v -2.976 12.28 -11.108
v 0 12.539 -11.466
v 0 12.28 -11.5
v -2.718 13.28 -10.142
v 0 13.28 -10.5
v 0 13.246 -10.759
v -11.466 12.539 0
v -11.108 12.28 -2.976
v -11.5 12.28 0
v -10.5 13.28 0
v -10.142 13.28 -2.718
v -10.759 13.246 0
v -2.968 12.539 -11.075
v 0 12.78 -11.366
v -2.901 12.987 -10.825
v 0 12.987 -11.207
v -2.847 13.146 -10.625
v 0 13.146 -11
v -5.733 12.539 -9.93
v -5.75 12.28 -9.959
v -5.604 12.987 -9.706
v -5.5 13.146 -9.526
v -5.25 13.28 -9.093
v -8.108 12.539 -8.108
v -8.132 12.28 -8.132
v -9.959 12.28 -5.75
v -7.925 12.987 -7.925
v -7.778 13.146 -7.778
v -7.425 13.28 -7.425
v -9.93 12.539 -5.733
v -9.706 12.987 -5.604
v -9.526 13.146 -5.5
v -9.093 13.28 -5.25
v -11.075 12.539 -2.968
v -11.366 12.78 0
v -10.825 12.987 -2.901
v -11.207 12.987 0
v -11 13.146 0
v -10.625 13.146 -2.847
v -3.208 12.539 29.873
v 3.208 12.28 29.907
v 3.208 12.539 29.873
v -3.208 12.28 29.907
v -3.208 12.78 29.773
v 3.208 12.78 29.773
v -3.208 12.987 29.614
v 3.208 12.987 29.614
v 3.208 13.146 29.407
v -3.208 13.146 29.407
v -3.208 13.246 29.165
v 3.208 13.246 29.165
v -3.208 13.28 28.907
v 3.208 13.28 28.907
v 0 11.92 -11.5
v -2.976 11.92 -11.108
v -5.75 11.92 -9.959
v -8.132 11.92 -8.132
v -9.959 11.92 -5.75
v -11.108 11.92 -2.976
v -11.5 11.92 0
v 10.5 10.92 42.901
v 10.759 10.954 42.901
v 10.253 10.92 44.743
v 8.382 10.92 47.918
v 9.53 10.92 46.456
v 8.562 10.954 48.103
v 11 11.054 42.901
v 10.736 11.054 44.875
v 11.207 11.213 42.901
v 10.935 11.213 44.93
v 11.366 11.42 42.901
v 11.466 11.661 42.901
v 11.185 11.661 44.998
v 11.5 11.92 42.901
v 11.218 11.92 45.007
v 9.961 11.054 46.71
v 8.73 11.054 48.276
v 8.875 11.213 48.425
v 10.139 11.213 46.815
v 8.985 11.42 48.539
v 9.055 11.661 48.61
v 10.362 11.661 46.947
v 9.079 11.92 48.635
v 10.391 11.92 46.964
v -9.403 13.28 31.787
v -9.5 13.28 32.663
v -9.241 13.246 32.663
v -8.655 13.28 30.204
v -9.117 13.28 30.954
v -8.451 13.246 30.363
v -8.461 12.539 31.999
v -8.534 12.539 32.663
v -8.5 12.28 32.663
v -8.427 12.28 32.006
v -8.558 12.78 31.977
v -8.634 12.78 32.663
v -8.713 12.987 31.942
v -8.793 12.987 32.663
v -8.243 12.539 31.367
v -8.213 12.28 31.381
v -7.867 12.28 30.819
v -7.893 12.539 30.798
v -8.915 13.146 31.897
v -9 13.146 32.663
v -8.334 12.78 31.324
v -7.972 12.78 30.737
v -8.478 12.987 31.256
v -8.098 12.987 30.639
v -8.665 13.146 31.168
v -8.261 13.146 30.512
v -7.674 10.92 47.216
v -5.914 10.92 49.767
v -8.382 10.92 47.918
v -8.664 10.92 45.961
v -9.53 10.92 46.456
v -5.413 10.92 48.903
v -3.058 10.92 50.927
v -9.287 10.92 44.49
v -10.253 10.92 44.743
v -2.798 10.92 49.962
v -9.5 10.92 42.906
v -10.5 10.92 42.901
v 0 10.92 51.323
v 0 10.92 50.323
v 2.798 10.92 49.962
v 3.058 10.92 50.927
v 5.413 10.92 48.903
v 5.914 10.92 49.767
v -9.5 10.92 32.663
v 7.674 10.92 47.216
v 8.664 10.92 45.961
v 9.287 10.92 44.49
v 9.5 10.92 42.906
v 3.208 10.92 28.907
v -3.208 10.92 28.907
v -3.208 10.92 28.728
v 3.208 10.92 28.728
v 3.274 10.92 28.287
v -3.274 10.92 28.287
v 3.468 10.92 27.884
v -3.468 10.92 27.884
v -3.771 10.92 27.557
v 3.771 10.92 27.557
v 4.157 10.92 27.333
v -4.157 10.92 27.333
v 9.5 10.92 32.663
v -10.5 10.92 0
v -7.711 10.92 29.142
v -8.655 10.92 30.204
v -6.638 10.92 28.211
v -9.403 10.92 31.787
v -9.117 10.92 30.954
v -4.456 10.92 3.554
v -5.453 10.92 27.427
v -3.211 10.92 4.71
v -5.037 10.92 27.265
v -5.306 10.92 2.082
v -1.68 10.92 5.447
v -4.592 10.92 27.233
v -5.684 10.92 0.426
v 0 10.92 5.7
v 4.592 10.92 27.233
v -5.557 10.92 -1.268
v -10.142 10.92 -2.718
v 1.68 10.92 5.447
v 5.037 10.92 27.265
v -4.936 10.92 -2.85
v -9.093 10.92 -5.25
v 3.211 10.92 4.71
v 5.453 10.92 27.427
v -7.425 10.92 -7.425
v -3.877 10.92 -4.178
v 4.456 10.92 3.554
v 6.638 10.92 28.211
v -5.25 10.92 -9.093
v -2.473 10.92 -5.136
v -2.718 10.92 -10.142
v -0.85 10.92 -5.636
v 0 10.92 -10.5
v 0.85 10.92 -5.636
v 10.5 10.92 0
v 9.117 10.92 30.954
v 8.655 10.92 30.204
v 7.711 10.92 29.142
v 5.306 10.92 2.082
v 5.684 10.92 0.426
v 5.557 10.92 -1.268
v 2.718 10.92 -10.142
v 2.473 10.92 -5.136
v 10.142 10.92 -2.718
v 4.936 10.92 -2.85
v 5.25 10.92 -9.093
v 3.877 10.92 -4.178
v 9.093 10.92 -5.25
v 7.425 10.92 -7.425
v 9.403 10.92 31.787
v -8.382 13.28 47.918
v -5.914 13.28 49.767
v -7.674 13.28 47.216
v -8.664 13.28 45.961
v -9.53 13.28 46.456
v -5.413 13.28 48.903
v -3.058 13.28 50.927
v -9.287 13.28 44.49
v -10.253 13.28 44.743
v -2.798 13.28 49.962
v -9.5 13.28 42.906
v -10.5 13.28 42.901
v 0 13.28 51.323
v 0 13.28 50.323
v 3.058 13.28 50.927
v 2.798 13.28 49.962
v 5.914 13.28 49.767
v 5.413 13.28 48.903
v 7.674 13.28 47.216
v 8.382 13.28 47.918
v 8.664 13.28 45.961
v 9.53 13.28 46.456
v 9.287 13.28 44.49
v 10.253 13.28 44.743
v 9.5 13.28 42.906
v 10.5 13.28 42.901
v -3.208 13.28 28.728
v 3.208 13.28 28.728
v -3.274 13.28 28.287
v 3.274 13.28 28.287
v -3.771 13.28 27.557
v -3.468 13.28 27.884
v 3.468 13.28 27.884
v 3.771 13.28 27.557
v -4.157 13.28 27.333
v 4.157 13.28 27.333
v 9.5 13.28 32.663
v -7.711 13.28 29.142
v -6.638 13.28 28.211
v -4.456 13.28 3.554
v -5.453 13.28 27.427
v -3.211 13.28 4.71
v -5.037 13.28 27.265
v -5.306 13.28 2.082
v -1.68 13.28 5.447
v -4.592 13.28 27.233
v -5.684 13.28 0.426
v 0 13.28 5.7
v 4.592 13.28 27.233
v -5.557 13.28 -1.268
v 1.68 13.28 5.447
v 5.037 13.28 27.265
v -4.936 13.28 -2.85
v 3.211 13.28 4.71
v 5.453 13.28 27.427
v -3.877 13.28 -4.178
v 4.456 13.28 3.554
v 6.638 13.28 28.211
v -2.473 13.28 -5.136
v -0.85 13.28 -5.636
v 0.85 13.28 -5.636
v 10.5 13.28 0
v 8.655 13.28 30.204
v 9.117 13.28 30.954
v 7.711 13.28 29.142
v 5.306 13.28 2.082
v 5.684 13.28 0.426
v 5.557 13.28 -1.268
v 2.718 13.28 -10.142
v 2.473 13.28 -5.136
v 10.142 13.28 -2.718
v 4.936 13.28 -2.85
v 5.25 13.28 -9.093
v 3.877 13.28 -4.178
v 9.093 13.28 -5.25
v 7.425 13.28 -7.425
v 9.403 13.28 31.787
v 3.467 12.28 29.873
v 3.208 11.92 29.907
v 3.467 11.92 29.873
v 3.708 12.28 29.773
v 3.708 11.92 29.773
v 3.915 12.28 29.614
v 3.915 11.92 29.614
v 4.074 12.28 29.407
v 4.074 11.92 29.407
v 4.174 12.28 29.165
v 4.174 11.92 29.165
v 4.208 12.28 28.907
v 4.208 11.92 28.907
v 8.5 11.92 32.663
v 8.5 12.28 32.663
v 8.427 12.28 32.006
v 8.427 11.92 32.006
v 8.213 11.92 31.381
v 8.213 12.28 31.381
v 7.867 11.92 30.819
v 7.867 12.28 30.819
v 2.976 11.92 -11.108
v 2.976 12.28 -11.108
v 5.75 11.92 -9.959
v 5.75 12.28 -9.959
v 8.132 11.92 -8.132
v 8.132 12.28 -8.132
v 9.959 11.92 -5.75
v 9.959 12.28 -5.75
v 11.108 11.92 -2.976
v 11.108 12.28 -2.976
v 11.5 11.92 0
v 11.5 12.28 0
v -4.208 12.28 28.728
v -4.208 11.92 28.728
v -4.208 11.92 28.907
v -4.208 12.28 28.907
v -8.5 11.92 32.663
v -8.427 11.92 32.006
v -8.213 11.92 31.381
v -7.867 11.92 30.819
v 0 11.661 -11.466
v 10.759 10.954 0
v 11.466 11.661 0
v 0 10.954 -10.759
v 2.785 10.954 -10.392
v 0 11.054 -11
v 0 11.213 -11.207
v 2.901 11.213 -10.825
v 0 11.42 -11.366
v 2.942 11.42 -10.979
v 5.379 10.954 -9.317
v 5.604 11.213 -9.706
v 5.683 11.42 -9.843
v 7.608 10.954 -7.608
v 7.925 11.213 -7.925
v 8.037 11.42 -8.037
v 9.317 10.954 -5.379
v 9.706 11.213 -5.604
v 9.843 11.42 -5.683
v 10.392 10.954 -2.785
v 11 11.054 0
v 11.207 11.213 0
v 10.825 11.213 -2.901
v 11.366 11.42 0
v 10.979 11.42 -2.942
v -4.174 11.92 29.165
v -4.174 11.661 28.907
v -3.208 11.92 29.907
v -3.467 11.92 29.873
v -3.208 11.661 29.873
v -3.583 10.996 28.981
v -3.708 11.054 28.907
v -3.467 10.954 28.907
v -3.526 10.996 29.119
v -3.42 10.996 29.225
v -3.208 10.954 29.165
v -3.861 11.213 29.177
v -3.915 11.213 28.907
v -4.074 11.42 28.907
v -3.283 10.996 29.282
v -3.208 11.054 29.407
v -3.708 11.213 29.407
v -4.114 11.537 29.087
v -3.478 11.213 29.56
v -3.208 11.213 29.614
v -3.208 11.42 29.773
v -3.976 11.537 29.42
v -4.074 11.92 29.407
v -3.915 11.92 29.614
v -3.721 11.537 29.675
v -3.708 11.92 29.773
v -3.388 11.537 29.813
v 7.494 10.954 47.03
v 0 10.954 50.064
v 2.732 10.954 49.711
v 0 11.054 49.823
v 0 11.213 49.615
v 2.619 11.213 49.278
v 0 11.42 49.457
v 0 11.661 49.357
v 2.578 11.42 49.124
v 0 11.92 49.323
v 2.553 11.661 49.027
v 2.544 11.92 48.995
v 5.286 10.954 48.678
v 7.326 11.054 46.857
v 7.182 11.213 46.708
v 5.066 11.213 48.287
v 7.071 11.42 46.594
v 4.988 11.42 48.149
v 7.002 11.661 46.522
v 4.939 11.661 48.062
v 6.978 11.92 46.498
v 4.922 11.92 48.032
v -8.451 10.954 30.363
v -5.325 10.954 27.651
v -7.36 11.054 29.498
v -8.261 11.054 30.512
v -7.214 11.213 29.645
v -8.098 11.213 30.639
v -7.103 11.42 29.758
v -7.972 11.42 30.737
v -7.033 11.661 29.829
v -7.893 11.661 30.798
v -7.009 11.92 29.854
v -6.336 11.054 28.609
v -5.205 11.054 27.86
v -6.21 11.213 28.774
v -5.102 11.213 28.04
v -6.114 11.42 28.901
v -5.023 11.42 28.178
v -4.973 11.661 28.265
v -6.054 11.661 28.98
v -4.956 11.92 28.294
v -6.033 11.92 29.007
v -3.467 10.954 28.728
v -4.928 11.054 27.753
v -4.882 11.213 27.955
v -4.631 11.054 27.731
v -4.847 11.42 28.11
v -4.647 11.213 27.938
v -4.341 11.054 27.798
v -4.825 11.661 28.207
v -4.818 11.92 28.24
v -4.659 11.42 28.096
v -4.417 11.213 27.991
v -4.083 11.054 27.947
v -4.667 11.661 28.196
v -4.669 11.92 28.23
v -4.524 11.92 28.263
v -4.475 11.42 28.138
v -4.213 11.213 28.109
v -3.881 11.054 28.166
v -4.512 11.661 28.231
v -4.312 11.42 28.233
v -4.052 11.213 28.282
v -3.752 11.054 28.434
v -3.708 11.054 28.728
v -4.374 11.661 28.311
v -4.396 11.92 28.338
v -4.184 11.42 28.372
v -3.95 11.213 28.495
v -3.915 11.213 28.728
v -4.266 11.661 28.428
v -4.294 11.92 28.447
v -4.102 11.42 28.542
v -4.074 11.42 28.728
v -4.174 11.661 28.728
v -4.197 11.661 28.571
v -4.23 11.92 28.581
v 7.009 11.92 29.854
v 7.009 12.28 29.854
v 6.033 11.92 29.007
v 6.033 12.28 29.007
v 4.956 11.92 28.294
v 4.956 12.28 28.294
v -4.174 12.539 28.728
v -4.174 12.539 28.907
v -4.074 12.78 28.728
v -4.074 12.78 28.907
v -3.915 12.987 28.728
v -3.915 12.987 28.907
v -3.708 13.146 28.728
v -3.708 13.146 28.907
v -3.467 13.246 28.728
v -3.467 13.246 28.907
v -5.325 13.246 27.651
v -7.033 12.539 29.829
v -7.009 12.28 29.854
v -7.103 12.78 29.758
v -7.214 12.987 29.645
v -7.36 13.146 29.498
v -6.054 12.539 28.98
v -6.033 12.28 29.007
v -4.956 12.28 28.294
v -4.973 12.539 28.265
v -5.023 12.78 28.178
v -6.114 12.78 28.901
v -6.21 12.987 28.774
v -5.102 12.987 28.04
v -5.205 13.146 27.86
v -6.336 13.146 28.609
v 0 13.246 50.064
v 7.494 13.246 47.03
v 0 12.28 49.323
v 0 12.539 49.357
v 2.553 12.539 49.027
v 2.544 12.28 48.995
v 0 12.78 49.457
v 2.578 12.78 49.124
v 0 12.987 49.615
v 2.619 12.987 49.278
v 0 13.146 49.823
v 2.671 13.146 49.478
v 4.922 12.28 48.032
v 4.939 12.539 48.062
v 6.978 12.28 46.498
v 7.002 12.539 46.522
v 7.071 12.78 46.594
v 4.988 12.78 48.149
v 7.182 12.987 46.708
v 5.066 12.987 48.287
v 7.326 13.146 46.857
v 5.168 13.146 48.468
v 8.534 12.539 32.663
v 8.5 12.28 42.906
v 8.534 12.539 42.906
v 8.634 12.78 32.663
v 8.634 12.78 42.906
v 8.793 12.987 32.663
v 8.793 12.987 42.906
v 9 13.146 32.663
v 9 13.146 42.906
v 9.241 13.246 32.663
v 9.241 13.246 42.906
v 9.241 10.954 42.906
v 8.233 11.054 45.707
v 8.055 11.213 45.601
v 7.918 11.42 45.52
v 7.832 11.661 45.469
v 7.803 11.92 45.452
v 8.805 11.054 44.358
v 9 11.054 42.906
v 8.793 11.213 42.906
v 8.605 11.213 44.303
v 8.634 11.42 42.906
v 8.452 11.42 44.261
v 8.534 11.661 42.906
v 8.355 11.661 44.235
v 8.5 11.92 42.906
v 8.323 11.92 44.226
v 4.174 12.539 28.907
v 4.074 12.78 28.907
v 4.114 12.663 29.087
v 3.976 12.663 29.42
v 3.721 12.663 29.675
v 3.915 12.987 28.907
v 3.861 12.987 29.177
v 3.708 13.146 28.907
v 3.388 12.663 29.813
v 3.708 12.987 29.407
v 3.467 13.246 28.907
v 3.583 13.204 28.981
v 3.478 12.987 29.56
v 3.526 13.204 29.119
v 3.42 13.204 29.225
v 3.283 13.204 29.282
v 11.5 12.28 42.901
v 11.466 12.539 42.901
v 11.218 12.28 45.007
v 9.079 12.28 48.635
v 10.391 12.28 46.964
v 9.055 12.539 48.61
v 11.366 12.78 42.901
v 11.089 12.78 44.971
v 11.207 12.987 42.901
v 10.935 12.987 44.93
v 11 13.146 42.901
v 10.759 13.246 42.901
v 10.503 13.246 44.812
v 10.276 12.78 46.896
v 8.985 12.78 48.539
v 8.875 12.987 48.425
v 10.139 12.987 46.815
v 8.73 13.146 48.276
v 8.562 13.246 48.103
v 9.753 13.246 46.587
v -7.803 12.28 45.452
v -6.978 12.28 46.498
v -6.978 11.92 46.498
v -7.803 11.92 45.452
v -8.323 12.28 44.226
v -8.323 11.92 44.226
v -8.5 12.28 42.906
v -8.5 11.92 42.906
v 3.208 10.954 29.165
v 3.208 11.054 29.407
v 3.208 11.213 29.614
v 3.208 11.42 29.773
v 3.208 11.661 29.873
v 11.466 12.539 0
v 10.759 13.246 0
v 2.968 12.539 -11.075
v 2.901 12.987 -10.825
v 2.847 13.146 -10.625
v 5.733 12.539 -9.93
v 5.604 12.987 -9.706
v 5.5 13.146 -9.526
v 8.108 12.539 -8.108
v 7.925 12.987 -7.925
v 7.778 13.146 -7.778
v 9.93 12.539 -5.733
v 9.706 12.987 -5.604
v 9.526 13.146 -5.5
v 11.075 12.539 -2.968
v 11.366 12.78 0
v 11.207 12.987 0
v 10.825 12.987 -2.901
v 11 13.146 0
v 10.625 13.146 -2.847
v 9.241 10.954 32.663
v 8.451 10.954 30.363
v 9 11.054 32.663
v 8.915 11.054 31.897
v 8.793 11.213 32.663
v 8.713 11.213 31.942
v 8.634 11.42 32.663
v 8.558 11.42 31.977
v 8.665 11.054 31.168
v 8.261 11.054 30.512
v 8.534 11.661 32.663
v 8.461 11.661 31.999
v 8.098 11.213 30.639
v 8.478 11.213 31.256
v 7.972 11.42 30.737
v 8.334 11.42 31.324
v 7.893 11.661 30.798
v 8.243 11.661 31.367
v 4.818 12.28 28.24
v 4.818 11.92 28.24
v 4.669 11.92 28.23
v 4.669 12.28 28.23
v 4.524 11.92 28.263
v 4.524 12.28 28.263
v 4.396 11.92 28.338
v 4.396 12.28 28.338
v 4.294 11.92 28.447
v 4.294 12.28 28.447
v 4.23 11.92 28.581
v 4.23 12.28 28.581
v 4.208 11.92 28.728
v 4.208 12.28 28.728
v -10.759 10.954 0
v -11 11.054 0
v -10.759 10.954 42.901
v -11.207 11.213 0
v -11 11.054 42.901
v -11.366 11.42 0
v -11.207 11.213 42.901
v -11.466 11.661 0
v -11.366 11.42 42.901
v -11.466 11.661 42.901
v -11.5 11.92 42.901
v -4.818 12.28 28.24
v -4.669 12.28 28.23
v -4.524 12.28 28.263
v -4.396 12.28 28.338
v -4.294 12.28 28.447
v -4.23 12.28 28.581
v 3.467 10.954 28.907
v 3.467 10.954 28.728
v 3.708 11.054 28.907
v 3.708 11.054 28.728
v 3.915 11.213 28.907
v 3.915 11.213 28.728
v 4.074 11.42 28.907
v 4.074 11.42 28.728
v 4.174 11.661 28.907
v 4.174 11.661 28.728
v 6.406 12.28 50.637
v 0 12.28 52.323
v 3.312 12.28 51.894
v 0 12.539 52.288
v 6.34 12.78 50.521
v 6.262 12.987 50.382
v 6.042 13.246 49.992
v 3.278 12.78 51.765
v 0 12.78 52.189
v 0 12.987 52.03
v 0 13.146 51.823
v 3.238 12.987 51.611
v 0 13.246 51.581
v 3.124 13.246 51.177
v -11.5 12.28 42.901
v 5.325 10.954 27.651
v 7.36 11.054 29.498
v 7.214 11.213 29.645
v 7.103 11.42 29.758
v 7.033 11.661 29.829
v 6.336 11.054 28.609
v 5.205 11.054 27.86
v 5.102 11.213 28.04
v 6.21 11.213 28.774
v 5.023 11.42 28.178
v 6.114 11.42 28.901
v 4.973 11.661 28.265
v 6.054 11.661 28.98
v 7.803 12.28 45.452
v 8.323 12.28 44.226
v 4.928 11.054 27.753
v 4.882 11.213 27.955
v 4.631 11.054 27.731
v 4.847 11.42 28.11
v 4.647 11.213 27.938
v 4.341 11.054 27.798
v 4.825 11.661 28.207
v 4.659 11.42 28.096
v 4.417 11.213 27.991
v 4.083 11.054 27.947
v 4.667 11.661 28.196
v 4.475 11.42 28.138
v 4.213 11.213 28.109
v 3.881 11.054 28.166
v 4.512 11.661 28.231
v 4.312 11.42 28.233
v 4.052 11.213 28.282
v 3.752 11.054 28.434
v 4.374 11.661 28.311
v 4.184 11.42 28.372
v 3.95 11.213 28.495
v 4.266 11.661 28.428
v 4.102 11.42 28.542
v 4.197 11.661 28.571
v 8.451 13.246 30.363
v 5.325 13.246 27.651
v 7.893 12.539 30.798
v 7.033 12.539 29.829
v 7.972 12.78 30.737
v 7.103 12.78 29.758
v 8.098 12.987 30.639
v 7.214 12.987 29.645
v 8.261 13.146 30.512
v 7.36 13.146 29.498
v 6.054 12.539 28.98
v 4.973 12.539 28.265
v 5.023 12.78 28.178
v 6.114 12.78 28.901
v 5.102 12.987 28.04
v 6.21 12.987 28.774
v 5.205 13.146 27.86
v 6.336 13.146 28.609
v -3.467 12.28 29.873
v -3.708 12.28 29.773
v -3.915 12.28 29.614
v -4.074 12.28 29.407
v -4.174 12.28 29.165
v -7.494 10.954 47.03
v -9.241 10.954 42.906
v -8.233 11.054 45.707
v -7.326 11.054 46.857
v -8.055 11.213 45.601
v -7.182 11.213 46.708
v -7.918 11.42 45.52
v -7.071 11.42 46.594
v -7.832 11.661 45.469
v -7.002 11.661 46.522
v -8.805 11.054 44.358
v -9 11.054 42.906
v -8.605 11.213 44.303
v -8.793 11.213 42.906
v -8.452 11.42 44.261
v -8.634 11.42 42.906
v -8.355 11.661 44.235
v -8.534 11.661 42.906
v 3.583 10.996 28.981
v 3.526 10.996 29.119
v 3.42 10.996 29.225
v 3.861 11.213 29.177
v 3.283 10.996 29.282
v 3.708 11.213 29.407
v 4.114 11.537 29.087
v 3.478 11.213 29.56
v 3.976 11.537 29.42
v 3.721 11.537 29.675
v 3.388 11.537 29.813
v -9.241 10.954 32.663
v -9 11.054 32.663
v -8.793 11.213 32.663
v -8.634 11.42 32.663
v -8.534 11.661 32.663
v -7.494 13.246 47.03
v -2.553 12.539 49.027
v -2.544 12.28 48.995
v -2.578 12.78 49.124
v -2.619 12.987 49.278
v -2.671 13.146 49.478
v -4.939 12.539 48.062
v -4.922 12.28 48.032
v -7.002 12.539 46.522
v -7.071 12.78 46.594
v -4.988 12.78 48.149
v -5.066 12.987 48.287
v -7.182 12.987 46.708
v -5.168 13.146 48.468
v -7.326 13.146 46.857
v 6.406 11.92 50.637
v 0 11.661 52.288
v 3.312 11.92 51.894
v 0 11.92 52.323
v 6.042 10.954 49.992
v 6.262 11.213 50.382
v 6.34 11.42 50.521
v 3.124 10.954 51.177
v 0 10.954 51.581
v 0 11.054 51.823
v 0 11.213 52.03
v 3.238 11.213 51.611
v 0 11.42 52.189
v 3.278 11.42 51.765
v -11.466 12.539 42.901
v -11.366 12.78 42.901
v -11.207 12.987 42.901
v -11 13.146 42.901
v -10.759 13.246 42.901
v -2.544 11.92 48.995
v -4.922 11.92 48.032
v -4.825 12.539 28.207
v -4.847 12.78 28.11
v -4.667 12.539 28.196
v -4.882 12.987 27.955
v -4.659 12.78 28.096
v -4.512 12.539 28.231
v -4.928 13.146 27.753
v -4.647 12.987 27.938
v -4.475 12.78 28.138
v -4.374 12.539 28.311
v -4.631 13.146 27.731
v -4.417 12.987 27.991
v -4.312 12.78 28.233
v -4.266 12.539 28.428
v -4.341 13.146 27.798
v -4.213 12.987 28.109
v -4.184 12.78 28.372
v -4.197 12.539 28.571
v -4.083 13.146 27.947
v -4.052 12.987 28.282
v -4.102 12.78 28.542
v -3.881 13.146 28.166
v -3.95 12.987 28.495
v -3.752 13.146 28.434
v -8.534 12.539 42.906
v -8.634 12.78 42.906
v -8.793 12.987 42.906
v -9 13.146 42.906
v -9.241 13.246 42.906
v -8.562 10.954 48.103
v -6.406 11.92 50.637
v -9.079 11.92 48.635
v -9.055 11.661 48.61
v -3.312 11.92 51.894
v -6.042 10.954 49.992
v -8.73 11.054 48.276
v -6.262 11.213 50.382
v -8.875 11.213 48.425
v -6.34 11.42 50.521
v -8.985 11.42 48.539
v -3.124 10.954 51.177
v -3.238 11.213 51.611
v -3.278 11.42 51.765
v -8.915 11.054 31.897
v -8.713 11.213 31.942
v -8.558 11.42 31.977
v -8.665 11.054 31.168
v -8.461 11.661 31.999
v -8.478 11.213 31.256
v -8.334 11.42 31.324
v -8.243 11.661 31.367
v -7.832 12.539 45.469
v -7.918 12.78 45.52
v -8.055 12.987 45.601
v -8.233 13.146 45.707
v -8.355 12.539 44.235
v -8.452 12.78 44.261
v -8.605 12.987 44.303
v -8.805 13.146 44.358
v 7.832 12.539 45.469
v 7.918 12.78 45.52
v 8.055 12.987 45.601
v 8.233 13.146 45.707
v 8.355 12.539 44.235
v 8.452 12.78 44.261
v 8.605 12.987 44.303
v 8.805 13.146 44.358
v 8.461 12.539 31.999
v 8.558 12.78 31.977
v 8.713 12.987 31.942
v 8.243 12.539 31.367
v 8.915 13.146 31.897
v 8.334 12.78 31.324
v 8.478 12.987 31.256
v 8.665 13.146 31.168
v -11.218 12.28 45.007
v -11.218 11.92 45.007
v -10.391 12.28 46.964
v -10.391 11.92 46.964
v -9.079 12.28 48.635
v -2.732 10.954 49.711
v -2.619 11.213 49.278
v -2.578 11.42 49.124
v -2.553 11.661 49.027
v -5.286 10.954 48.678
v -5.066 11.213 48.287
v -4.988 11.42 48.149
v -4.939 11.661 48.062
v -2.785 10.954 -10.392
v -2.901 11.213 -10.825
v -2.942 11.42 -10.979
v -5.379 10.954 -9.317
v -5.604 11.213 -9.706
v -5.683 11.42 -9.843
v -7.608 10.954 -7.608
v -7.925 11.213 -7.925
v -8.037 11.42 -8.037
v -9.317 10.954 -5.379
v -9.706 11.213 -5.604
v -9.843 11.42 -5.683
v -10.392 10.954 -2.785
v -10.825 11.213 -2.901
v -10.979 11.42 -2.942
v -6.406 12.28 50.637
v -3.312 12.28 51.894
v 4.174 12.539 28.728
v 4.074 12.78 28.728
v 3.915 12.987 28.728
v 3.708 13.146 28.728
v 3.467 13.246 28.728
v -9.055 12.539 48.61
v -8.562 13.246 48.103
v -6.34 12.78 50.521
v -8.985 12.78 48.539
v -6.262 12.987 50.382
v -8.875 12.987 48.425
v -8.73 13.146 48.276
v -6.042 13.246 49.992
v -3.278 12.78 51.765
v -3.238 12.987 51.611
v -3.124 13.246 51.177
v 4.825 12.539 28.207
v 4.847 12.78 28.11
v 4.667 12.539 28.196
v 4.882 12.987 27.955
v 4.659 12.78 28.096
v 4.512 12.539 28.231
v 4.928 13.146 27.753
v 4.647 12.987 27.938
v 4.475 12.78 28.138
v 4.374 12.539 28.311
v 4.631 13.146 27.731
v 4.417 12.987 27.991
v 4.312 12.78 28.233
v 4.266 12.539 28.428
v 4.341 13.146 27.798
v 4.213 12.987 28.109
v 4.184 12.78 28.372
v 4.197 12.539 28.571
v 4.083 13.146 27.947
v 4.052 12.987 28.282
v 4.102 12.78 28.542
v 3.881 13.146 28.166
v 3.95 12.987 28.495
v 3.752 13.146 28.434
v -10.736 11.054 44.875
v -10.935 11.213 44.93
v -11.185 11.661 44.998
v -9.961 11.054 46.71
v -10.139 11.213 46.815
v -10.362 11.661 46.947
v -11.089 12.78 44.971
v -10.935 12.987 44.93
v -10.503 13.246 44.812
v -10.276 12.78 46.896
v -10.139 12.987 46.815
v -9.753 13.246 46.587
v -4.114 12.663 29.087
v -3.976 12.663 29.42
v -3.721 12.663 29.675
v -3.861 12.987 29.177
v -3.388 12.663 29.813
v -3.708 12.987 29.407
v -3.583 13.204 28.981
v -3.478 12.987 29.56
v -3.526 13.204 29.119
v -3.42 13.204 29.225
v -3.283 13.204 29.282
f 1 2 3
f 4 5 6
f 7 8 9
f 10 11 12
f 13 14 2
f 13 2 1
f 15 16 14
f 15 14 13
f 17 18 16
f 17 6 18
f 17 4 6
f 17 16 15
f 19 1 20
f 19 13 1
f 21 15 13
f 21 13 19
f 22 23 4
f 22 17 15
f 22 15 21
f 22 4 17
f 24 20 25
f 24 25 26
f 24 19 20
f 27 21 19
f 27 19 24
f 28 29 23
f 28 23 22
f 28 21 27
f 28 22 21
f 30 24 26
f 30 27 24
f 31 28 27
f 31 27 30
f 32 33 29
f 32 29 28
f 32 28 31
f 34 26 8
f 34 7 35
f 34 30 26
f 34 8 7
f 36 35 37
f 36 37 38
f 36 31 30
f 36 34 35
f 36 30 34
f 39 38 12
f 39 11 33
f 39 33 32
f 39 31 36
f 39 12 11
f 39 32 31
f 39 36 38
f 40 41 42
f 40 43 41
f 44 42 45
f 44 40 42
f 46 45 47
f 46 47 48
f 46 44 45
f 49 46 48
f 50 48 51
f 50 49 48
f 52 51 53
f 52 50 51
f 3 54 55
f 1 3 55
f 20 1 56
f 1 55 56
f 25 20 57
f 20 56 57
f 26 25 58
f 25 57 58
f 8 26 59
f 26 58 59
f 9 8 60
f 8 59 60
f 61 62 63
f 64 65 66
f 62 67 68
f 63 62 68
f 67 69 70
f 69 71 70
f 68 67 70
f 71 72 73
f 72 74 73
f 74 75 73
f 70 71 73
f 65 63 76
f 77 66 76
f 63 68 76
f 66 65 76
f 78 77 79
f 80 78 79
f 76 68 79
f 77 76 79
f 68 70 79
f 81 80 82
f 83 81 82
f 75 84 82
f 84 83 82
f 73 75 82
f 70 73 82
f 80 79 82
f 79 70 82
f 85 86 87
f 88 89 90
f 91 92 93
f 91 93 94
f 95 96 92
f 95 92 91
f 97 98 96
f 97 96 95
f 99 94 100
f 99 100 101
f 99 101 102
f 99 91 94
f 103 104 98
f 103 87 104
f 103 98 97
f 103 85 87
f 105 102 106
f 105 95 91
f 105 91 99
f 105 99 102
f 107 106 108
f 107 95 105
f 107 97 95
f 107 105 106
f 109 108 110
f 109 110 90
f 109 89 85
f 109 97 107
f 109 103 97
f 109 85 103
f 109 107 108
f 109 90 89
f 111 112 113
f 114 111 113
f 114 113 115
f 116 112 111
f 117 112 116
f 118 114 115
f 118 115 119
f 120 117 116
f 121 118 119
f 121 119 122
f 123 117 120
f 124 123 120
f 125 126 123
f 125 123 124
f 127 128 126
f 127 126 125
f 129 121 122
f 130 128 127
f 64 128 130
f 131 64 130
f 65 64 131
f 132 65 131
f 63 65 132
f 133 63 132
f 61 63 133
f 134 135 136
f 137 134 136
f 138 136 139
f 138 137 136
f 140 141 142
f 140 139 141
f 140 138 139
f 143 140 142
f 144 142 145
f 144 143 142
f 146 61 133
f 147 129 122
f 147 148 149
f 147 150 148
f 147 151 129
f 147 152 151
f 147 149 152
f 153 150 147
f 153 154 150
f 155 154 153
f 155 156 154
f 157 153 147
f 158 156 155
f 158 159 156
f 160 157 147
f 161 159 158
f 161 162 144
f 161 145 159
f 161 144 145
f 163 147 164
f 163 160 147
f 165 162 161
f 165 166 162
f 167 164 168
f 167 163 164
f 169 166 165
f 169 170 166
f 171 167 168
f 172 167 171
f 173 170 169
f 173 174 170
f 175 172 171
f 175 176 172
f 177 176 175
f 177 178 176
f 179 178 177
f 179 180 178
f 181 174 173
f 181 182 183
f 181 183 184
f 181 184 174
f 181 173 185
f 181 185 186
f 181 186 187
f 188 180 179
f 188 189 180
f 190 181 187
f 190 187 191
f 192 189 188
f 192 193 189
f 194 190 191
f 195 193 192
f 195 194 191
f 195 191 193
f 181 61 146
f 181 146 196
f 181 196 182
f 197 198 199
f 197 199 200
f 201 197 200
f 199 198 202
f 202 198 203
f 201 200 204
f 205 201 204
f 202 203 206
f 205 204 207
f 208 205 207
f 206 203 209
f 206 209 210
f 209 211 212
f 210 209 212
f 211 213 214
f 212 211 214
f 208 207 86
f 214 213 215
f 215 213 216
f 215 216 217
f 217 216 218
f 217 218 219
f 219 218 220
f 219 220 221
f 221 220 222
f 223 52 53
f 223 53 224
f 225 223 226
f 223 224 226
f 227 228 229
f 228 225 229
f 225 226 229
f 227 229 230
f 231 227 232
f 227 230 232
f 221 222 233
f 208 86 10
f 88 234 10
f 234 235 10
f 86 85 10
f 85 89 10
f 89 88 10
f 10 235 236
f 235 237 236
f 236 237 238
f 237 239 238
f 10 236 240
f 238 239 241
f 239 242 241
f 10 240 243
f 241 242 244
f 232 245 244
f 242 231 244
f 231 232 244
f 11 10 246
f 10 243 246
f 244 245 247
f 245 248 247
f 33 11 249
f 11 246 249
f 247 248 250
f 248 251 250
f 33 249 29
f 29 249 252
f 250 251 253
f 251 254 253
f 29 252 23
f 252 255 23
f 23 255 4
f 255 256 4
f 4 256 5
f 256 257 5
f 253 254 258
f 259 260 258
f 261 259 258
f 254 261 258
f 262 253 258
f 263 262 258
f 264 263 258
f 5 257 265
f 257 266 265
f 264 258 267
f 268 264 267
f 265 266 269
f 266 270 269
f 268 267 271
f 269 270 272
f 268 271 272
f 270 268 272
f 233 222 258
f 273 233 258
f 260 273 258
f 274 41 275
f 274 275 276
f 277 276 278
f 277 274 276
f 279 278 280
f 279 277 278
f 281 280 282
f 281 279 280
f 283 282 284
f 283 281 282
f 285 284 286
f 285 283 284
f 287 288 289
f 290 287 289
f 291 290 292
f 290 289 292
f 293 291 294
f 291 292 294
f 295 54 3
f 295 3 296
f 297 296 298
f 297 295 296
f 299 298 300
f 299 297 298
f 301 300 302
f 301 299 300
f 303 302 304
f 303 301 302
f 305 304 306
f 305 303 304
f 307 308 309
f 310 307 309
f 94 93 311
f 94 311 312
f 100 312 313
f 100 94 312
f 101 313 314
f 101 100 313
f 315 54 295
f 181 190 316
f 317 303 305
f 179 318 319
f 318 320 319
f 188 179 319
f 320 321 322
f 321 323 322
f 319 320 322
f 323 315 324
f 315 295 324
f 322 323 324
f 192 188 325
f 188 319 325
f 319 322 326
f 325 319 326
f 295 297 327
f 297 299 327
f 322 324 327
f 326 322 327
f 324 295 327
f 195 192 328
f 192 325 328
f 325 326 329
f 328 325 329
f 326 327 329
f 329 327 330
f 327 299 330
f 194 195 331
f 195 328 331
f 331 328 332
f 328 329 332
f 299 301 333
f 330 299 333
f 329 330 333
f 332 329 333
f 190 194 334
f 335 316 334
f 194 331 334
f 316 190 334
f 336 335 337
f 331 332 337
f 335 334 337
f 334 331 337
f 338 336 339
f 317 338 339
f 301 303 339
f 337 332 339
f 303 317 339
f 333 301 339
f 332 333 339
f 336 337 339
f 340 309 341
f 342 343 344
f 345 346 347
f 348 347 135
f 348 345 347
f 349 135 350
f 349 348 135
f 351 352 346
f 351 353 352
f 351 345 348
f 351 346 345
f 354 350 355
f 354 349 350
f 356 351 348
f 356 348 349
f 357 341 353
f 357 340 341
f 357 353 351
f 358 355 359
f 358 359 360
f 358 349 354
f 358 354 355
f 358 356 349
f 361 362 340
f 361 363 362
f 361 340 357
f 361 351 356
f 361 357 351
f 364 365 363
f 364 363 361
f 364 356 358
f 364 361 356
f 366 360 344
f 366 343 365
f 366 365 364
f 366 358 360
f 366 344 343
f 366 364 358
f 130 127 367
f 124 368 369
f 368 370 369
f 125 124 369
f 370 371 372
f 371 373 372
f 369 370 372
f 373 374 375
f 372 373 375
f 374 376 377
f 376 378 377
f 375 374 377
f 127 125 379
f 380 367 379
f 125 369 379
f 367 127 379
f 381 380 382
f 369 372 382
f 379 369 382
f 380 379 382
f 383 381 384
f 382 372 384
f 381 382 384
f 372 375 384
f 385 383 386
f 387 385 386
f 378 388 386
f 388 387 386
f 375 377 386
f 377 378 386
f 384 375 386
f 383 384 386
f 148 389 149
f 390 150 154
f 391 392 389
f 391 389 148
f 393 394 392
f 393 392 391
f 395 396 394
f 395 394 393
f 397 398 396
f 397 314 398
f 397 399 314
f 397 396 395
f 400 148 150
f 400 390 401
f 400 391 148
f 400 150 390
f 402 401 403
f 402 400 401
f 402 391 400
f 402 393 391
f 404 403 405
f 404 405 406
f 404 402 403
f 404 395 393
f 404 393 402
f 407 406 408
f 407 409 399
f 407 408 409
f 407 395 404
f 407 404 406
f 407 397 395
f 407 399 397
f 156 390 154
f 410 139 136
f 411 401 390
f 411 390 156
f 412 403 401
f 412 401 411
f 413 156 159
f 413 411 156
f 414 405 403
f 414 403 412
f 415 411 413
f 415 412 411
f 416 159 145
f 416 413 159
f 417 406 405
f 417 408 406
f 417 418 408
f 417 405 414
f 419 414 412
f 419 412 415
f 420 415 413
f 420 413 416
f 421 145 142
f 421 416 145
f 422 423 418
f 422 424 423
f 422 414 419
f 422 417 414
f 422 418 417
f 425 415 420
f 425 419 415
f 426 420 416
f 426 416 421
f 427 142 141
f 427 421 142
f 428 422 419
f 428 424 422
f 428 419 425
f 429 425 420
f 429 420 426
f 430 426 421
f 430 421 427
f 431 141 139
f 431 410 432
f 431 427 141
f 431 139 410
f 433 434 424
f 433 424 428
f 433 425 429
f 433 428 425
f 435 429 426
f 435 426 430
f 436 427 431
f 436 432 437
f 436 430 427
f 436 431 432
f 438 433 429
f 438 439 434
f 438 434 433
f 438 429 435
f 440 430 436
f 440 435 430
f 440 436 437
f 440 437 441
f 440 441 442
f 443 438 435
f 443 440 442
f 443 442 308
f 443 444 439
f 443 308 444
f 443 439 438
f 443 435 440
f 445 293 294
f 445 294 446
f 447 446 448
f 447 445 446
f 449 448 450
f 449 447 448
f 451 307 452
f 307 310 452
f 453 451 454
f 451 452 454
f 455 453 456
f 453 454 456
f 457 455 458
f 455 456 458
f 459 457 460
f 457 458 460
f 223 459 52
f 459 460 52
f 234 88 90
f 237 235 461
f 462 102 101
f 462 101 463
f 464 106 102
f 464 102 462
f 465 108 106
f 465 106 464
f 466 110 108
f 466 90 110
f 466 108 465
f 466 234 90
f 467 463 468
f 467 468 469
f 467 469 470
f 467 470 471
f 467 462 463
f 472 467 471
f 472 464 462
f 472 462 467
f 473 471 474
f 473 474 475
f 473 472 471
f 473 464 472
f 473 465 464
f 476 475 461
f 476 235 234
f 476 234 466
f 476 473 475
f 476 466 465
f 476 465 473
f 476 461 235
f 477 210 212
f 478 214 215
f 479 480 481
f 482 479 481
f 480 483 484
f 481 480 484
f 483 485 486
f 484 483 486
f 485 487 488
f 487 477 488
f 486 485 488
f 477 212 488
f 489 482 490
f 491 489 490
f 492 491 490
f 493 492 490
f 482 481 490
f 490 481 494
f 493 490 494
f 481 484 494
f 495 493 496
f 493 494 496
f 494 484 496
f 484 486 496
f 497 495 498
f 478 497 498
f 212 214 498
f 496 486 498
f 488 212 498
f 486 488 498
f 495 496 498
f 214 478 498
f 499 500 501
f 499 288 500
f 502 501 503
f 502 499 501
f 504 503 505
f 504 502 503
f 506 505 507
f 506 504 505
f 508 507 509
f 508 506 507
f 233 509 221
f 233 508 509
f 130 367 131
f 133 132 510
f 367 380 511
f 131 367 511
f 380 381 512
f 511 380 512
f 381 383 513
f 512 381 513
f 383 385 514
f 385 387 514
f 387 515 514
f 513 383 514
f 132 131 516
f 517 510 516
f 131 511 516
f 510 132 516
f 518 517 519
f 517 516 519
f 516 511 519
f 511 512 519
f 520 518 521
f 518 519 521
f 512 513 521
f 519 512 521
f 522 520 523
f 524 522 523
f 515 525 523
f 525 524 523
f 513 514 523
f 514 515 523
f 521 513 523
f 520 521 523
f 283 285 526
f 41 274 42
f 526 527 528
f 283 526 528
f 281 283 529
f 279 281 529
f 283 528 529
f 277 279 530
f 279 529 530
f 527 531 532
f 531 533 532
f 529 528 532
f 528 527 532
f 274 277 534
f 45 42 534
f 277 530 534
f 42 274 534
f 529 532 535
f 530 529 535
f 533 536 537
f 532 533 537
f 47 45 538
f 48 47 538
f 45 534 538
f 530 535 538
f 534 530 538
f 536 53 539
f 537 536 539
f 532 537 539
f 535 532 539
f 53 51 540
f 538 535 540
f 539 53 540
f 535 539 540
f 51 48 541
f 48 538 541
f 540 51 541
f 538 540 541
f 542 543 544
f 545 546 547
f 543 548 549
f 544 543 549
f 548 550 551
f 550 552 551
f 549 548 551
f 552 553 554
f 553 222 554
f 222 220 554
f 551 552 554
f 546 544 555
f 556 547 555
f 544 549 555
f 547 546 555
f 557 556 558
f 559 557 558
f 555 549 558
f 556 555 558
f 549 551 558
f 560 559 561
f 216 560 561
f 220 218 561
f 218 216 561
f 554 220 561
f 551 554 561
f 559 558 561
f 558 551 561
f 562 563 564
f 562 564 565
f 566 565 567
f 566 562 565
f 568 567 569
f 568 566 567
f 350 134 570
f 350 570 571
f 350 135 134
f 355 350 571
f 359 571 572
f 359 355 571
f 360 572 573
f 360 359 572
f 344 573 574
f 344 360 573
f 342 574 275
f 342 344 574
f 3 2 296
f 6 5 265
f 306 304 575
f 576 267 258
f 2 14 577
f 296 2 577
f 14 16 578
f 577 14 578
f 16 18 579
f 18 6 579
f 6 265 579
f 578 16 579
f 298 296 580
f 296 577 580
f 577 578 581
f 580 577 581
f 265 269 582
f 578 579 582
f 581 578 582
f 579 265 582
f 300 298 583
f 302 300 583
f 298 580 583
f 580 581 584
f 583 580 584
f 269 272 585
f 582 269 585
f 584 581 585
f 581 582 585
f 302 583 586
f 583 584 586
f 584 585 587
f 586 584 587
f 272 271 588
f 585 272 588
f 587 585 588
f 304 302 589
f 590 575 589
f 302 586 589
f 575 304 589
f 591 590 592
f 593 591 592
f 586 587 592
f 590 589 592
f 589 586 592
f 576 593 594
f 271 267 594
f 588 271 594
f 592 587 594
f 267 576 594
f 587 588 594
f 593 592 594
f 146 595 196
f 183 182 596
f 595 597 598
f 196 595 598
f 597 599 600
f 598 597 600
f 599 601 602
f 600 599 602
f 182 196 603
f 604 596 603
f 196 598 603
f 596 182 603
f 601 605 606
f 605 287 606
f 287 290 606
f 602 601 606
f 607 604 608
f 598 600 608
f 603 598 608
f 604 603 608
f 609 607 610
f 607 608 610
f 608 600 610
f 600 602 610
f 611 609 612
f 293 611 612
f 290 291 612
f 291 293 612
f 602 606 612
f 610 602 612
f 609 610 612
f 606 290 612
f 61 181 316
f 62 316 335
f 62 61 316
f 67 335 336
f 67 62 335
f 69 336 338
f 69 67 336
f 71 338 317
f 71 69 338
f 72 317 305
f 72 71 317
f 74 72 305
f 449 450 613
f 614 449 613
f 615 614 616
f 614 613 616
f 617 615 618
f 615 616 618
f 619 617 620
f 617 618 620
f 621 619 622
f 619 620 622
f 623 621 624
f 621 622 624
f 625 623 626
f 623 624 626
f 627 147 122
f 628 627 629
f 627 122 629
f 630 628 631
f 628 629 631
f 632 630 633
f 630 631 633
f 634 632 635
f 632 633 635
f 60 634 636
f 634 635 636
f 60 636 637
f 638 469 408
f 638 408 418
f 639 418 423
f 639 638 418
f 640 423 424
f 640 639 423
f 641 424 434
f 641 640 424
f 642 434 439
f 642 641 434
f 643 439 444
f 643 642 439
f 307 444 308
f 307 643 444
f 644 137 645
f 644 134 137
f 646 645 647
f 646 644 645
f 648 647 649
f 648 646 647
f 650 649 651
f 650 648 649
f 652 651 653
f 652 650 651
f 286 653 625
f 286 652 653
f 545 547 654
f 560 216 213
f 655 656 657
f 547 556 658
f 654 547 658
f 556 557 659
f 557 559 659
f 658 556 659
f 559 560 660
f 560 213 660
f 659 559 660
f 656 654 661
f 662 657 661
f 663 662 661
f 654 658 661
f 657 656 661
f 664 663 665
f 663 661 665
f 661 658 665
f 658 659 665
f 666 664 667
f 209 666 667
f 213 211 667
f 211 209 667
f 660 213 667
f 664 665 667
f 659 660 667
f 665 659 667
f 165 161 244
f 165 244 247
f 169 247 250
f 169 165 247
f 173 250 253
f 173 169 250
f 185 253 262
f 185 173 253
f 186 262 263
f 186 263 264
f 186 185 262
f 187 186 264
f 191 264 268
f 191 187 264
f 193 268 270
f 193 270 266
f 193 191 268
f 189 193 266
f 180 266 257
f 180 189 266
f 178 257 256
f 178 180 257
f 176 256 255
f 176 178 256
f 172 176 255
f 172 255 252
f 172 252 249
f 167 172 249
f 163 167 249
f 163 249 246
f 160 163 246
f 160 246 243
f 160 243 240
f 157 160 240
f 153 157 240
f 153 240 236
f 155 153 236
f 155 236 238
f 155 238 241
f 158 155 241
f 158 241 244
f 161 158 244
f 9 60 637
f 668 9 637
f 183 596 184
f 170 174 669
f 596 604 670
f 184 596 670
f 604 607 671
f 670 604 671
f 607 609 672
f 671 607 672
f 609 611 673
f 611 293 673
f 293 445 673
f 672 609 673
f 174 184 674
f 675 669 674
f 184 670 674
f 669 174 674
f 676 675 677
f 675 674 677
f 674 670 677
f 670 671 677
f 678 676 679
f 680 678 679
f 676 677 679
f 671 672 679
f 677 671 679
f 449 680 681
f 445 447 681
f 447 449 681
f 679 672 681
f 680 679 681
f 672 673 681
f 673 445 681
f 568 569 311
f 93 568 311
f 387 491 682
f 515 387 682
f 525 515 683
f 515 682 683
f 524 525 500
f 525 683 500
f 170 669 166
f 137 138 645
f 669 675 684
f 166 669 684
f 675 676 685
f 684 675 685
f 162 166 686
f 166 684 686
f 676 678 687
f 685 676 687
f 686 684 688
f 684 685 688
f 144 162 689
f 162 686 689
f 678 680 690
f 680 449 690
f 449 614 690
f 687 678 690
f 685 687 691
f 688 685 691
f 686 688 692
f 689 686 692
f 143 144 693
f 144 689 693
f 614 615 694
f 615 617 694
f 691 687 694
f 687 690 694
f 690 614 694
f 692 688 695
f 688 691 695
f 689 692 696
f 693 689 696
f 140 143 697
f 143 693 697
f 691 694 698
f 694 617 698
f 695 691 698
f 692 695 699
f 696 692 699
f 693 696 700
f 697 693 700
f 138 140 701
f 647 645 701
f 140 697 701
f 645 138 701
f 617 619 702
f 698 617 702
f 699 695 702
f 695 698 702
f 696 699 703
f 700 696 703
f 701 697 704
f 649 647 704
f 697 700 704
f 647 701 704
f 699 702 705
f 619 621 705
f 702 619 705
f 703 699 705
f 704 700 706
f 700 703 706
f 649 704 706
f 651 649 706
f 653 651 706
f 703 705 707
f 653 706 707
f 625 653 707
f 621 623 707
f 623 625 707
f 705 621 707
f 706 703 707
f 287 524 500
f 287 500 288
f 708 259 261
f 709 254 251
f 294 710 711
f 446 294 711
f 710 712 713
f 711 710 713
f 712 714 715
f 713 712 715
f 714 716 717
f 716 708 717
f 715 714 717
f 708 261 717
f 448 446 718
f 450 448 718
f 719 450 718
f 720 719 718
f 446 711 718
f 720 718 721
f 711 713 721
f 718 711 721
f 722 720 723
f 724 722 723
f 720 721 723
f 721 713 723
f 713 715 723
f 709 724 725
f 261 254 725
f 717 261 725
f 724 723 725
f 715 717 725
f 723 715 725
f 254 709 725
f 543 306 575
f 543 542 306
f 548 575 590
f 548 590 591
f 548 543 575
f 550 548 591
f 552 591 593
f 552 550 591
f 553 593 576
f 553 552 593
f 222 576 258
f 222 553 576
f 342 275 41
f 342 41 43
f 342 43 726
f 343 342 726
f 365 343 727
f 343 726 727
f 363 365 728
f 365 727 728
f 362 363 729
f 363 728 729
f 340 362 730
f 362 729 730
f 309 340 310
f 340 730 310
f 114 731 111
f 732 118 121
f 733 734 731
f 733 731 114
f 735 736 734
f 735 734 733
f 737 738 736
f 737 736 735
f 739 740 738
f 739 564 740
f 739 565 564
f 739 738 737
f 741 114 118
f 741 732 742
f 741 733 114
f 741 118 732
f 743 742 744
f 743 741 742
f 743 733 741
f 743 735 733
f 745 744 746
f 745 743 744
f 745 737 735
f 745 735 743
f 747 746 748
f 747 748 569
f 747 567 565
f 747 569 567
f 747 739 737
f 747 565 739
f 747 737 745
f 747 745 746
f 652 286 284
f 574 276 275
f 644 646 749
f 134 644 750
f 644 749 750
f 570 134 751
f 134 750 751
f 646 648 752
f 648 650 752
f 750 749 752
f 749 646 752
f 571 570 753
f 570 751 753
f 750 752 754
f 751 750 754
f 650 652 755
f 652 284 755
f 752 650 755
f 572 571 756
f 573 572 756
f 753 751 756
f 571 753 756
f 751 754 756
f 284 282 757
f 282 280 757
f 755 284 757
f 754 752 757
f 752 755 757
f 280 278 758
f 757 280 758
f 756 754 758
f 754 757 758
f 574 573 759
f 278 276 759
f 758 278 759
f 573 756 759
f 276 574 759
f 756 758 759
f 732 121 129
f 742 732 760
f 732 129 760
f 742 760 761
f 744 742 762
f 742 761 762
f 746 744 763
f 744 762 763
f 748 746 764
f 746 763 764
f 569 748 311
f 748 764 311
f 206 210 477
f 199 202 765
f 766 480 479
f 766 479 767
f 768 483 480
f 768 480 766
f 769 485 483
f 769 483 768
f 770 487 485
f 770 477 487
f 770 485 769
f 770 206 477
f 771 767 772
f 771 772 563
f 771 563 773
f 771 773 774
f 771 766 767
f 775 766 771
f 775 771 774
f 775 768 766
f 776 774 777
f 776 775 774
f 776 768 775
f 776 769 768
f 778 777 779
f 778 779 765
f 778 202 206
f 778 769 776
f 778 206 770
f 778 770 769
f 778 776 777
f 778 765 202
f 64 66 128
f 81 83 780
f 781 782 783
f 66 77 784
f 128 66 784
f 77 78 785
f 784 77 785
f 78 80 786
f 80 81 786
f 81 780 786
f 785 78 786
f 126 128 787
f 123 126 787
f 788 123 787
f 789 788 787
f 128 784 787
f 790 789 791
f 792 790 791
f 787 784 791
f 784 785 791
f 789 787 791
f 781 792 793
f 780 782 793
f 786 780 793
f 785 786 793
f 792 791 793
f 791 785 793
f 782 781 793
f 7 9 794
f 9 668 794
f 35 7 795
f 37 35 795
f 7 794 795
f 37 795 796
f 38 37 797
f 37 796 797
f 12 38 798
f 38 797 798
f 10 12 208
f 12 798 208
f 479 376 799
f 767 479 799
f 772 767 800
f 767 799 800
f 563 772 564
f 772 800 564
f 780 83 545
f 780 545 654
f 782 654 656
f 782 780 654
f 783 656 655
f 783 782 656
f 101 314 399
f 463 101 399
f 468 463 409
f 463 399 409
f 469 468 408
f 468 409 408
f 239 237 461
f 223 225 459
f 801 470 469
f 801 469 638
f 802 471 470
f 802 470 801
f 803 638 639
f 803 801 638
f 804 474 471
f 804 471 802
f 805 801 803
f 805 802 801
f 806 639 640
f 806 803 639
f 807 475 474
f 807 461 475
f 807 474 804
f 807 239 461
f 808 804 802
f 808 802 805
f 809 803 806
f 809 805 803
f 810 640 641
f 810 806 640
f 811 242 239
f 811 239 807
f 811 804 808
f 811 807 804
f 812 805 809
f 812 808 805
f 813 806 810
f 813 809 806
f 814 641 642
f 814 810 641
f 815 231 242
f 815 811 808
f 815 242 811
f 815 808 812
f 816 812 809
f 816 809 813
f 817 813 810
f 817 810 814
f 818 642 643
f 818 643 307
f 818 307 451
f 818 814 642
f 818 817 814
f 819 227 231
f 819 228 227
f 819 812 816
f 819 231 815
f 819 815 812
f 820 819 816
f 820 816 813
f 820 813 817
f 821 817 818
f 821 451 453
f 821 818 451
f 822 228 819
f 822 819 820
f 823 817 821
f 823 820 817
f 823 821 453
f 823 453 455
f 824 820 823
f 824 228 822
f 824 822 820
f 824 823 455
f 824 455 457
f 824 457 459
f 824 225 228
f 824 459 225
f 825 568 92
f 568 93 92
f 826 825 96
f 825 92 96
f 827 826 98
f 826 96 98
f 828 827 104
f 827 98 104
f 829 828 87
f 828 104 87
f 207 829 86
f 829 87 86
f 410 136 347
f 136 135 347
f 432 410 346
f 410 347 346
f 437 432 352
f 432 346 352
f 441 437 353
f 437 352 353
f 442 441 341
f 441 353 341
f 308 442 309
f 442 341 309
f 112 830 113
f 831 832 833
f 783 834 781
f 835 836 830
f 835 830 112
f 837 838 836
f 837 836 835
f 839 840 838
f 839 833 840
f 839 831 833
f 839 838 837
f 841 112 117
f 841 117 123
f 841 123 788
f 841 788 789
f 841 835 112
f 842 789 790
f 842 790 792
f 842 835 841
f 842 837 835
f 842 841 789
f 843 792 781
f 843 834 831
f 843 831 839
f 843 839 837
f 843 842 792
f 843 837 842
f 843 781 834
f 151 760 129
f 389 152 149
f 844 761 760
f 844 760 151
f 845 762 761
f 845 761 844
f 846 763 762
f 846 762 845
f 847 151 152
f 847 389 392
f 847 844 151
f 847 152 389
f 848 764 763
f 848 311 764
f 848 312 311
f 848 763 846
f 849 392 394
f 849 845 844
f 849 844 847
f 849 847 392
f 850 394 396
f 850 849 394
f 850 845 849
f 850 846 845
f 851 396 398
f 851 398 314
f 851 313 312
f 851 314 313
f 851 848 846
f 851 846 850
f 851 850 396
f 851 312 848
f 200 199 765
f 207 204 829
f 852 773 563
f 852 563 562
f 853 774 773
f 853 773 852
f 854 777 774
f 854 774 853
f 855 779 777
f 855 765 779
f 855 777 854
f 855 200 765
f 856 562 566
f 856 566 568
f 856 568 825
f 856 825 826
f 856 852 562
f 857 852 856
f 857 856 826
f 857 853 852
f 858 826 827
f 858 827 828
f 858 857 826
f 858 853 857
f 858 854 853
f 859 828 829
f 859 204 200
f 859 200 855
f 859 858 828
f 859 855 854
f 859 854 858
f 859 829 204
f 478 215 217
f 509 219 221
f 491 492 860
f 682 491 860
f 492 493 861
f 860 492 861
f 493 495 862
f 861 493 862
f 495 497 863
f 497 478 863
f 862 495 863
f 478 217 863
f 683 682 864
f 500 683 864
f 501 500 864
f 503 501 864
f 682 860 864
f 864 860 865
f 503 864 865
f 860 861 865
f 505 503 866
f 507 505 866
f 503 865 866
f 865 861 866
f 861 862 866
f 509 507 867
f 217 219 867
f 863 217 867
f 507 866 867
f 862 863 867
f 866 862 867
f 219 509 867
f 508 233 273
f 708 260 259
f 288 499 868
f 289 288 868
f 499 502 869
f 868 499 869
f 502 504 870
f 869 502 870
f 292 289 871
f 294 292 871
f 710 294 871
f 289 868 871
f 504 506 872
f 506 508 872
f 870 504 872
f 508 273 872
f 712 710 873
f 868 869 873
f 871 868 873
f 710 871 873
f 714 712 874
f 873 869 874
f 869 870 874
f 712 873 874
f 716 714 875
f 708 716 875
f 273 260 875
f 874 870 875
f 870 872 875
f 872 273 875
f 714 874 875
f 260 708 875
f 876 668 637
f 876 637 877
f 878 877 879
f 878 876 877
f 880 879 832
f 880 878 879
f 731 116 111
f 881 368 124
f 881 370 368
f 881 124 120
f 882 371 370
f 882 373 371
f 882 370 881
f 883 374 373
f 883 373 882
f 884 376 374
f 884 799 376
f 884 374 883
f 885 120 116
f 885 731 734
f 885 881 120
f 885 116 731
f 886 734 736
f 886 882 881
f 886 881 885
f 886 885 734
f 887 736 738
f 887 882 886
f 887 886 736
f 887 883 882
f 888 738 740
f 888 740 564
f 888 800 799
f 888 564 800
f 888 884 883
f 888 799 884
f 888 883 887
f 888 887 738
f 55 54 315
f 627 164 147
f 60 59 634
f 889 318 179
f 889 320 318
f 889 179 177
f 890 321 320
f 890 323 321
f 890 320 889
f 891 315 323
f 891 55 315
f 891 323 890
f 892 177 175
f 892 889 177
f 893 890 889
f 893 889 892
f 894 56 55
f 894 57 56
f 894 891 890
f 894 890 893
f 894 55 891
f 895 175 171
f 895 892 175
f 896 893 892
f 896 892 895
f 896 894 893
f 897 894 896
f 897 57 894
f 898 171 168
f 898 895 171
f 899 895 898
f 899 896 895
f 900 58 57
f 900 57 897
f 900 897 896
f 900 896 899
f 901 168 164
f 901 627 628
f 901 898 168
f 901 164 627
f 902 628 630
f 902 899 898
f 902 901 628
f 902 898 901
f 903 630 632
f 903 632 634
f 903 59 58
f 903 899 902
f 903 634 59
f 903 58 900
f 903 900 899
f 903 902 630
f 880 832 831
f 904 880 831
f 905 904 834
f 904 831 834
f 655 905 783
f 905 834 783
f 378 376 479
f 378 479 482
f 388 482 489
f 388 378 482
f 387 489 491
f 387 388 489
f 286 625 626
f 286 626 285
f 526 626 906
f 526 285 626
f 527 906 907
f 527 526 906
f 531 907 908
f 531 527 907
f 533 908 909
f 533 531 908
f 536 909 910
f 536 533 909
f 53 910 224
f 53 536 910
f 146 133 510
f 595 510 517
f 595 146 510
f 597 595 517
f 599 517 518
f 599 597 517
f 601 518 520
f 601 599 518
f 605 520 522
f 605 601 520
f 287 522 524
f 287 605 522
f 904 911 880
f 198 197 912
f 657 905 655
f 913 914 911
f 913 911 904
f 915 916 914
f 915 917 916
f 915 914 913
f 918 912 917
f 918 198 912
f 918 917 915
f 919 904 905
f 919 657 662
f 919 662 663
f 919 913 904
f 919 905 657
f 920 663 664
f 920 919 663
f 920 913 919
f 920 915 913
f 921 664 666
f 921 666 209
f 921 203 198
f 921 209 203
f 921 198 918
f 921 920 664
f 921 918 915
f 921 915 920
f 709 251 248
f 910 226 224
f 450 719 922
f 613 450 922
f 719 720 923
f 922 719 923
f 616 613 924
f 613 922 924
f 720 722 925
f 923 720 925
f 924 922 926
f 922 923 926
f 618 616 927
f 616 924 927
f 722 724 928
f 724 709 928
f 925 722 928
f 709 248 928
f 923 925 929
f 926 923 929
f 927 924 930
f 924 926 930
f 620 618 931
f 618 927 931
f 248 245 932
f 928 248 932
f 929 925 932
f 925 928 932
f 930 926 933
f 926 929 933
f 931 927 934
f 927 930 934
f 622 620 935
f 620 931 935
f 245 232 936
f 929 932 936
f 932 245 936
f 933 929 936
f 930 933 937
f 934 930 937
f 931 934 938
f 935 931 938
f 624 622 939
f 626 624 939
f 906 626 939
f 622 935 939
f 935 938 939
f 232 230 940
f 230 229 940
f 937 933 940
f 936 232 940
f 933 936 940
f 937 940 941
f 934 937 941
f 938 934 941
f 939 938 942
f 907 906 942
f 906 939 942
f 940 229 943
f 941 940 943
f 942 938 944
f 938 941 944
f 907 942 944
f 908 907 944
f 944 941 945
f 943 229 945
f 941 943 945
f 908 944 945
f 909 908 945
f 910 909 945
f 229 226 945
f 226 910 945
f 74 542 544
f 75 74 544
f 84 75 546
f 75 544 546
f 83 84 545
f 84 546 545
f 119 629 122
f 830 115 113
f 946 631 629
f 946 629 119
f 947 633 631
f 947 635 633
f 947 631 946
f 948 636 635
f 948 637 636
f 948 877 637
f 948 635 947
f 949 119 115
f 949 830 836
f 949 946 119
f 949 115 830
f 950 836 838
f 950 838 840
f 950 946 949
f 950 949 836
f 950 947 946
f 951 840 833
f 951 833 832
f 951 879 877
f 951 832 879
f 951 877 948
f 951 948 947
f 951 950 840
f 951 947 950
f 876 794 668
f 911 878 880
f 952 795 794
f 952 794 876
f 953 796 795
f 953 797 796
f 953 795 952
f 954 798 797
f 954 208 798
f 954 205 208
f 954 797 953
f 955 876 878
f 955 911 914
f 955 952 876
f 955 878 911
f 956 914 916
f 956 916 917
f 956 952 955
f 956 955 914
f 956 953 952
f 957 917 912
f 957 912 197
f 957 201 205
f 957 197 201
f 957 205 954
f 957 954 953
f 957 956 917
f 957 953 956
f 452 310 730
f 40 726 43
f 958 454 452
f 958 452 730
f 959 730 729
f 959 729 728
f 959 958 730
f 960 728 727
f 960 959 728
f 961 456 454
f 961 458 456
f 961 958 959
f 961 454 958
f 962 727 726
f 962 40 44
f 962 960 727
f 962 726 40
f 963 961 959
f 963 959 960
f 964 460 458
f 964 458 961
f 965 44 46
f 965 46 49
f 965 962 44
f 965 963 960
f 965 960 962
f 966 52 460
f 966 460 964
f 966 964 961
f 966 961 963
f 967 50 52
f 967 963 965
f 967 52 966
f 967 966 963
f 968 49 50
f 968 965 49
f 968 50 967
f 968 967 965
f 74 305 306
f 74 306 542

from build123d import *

# Parameters (mm, degrees)
BOSS_EXTRUDE1_DEPTH = 2.36
CUT_EXTRUDE1_DEPTH  = 10
FILLET1_R           = 1
FILLET2_R           = 8
FILLET3_R           = 5
FILLET4_R           = 3
FILLET5_R           = 0.5
FILLET6_R           = 1
FILLET7_R           = 1


with BuildPart() as part:
    # Sketch3 → Boss-Extrude1 (new body)
    with BuildSketch(Plane(origin=(0, 10.92, 0), x_dir=(0, 0, 1), z_dir=(0, -1, 0))):
        with BuildLine():
            Line((-5.7, 0), (-12.000001825, 0))
            Line((-12.000001825, 0), (-12.000001825, 11.5))
            Line((-12.000001825, 11.5), (45.406310527, 11.5))
            ThreePointArc((45.406310527, 11.5), (50.46030749, 6.709778353), (52.322559669, 0))
            Line((52.322559669, 0), (49.322559669, 0))
            ThreePointArc((49.322559669, 0), (48.068036881, 4.857481326), (44.618252316, 8.499999508))
            Line((44.618252316, 8.499999508), (31.732809444, 8.499999508))
            ThreePointArc((31.732809444, 8.499999508), (29.503647996, 6.63570395), (27.906627074, 4.207889529))
            Line((27.906627074, 4.207889529), (29.906623676, 4.207889529))
            Line((29.906623676, 4.207889529), (29.906623676, 0))
            Line((29.906623676, 0), (5.7, 0))
            ThreePointArc((5.7, 0), (0, 5.7), (-5.7, 0))
        make_face()
    extrude(amount=-BOSS_EXTRUDE1_DEPTH)

    # Sketch5 → Cut-Extrude1 (cut)
    with BuildSketch(Plane(origin=(0, 10.92, 0), x_dir=(0, 0, 1), z_dir=(0, -1, 0))):
        with BuildLine():
            Line((0, 11.5), (0, 20.081542109))
            Line((0, 20.081542109), (-17.206571574, 20.081542109))
            Line((-17.206571574, 20.081542109), (-17.206571574, -3.325861619))
            Line((-17.206571574, -3.325861619), (-11.00857141, -3.325861619))
            ThreePointArc((-11.00857141, -3.325861619), (-9.23302249, 6.855749098), (0, 11.5))
        make_face()
    extrude(amount=-CUT_EXTRUDE1_DEPTH, mode=Mode.SUBTRACT)

    # Fillet1
    fillet1_edges = [part.edges().sort_by_distance(p)[0] for p in [
        (-4.207889529, 12.1, 29.906623676),
    ]]
    fillet(fillet1_edges, radius=FILLET1_R)

    # Fillet2
    fillet2_edges = [part.edges().sort_by_distance(p)[0] for p in [
        (-11.5, 12.1, 45.406310527),
    ]]
    fillet(fillet2_edges, radius=FILLET2_R)

    # Fillet3
    fillet3_edges = [part.edges().sort_by_distance(p)[0] for p in [
        (-8.499999508, 12.1, 44.618252316),
    ]]
    fillet(fillet3_edges, radius=FILLET3_R)

    # Fillet4
    fillet4_edges = [part.edges().sort_by_distance(p)[0] for p in [
        (-8.499999508, 12.1, 31.732809444),
    ]]
    fillet(fillet4_edges, radius=FILLET4_R)

    # Fillet5
    fillet5_edges = [part.edges().sort_by_distance(p)[0] for p in [
        (-4.207889529, 12.1, 27.906627074),
    ]]
    fillet(fillet5_edges, radius=FILLET5_R)

    # Fillet6
    fillet6_edges = [part.edges().sort_by_distance(p)[0] for p in [
        (-4.899665378, 10.92, 51.36538086),
        (-8.131727984, 10.92, -8.131727984),
        (-4.899665378, 13.28, 51.36538086),
        (-8.131727984, 13.28, -8.131727984),
        (-11.5, 10.92, 21.45040417),
        (-10.869902111, 10.92, 46.012808159),
        (-11.5, 13.28, 21.45040417),
        (-10.869902111, 13.28, 46.012808159),
    ]]
    fillet(fillet6_edges, radius=FILLET6_R)

    # Fillet7
    fillet7_edges = [part.edges().sort_by_distance(p)[0] for p in [
        (-1.603944764, 13.28, 29.906623676),
        (-1.603944764, 10.92, 29.906623676),
        (-4.207889529, 10.92, 28.817398931),
        (-3.91499631, 10.92, 29.613730457),
        (-4.207889529, 13.28, 28.817398931),
        (-3.91499631, 13.28, 29.613730457),
        (-3.764181528, 10.92, 48.589533472),
        (-3.764181528, 13.28, 48.589533472),
        (-8.103866337, 10.92, 44.856156934),
        (-8.103866337, 13.28, 44.856156934),
        (-8.499999508, 13.28, 37.784126486),
        (-8.499999508, 10.92, 37.784126486),
        (-8.337232062, 10.92, 31.68784918),
        (-8.337232062, 13.28, 31.68784918),
        (-6.534576313, 13.28, 29.414716402),
        (-6.534576313, 10.92, 29.414716402),
        (-4.457147388, 10.92, 28.295590808),
        (-4.457147388, 13.28, 28.295590808),
    ]]
    fillet(fillet7_edges, radius=FILLET7_R)

    # Mirror1: part across plane


with BuildPart() as part_1:
    add(part.part)
    add(part.part.mirror(Plane(origin=(0, 0, 0), x_dir=(0, 0, 1), z_dir=(1, 0, 0))))


solid = part_1.part
